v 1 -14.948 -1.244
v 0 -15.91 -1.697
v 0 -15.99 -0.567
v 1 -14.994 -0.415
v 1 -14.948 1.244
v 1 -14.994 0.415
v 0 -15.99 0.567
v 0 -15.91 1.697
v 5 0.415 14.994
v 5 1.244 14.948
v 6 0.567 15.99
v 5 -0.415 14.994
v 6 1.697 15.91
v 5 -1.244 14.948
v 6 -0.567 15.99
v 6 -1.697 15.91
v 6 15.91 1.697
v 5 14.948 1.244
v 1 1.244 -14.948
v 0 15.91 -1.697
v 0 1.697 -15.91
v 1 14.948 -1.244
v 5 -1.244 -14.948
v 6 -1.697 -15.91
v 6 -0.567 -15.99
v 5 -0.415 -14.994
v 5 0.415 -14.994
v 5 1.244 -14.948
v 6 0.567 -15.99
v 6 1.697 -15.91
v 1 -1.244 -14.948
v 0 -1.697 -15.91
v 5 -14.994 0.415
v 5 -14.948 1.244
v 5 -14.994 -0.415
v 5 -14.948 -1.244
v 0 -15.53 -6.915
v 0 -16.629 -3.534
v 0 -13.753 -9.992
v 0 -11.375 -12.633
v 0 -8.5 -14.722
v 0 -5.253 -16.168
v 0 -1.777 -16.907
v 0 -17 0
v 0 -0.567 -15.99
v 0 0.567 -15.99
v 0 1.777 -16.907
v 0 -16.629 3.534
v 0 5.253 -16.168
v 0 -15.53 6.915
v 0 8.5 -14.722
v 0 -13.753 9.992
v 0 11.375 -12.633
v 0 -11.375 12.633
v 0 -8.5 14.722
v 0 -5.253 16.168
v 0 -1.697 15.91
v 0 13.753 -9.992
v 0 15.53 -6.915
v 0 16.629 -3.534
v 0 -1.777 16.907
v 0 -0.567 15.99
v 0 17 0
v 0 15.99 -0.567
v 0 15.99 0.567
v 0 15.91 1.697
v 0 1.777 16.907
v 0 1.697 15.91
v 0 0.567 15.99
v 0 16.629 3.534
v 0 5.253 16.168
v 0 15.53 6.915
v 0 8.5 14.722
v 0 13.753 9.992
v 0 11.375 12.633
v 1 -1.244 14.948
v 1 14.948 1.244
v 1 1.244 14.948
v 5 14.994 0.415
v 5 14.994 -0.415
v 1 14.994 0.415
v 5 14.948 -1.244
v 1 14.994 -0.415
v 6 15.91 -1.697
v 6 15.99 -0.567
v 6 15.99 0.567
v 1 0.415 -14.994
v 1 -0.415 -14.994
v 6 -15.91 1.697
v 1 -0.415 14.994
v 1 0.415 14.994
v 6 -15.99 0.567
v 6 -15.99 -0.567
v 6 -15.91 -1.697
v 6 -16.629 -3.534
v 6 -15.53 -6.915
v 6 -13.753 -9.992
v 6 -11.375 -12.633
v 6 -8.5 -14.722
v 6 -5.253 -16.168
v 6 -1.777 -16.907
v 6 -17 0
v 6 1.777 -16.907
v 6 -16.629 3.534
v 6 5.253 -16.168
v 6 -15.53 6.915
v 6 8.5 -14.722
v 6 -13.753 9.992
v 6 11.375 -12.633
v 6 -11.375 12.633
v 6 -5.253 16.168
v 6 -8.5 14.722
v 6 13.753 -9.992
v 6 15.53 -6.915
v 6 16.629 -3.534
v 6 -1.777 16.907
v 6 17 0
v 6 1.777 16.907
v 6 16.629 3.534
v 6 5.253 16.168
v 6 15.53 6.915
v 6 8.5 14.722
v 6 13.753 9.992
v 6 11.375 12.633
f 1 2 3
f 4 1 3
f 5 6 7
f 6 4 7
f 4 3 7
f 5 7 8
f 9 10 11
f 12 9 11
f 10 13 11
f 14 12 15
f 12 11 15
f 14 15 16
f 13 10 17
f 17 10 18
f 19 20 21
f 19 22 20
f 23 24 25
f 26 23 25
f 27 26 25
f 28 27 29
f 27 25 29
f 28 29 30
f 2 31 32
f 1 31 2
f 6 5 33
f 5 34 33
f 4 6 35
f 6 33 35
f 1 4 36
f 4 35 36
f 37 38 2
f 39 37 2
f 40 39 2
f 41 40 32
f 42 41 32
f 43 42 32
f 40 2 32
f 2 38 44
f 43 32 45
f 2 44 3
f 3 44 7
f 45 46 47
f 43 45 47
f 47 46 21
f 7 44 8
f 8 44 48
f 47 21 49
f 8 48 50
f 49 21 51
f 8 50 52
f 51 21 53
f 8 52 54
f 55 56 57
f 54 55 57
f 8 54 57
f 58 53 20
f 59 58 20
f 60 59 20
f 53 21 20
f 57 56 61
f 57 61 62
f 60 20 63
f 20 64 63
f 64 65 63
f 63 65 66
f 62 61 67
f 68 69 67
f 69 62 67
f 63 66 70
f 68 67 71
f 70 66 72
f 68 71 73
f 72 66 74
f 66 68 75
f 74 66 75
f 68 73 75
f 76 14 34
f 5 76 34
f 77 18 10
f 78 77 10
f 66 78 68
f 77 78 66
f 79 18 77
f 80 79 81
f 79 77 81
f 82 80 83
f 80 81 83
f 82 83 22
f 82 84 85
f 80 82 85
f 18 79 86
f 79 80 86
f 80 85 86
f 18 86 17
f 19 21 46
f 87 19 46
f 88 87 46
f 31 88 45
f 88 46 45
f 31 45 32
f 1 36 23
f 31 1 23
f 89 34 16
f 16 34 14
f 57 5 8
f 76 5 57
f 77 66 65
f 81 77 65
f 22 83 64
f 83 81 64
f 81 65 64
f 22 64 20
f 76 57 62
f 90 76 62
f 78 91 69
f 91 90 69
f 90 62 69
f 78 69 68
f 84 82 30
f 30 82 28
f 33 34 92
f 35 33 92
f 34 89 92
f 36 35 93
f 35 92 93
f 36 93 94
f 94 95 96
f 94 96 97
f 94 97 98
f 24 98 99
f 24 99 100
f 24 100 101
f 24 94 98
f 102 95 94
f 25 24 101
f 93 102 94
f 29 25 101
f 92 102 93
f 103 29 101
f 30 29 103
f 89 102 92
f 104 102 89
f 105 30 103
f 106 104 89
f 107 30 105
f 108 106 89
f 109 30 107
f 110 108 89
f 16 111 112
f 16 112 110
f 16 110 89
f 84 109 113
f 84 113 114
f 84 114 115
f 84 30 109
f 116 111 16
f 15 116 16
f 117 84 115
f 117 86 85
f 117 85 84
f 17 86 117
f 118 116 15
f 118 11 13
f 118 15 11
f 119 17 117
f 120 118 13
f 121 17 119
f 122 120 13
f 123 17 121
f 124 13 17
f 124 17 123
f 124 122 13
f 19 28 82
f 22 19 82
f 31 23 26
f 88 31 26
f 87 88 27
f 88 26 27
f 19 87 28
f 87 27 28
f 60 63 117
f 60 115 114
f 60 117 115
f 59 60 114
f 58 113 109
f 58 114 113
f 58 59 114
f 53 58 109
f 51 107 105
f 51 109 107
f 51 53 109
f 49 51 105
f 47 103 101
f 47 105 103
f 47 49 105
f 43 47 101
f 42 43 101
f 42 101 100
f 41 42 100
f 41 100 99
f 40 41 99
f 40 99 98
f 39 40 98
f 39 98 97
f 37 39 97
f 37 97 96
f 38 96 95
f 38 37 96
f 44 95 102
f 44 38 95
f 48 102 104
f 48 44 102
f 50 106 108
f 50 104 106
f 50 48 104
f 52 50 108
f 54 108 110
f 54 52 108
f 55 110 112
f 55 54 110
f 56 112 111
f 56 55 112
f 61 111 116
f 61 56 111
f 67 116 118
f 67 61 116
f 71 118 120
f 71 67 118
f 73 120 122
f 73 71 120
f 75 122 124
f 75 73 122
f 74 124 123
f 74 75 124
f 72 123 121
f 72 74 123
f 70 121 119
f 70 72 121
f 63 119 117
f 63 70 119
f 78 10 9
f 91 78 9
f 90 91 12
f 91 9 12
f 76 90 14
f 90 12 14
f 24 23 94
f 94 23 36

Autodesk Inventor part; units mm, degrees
ref_plane "YZ Plane" through (0, 0, 0) normal (1, 0, 0) x (0, 1, 0)
ref_plane "XZ Plane" through (0, 0, 0) normal (0, 1, 0) x (-1, 0, 0)
ref_plane "XY Plane" through (0, 0, 0) normal (0, 0, 1) x (1, 0, 0)
sketch "스케치1" plane through (0, 0, 0) normal (1, 0, 0) x (0, 1, 0)
  circle A0 centre (0, 0) radius 15
  circle A1 centre (0, 0) radius 17
  dimension "d0" = 30
  dimension "d1" = 2
extrude "돌출1" add sketch "스케치1" along normal blind 6
sketch "스케치2" plane through (6, 0, 0) normal (1, 0, 0) x (0, 0, -1)
  line L0 (0, -16.1927) -> (16.1927, 0)
  line L1 (16.1927, 0) -> (0, 16.1927)
  line L2 (0, 16.1927) -> (-16.1927, 0)
  line L3 (-16.1927, 0) -> (0, -16.1927)
  line L4 (0, -16.1927) -> (0, 16.1927) construction
  line L5 (16.1927, 0) -> (-16.1927, 0) construction
  circle A0 centre (0, 0) radius 15 projected
  point P0 (-14.9483, -1.2445)
  point P1 (-14.9483, 1.2445)
  point P2 (-1.2445, 14.9483)
  point P3 (1.2445, 14.9483)
  point P4 (1.2445, -14.9483)
  point P5 (-1.2445, -14.9483)
  point P6 (14.9483, 1.2445)
  point P7 (14.9483, -1.2445)
  dimension "d4" = 22.9
  dimension "d5" = 22.9
extrude "돌출2" add sketch "스케치2" against normal up to surface (6 mm away) contours L3 A0 L0 | L0 A0 | A0 L3 | A0 L1 L0 | L3 L2 A0 | A0 L2 | L1 A0 | L2 L1 A0
chamfer "모따기1" distance 1 angle 45 16 edges at (6, -8.0964, -8.0964) (0, -8.0964, -8.0964) (6, -8.0964, 8.0964) (0, -8.0964, 8.0964) (6, -15, 0) (0, -15, 0) (0, 0, 15) (6, 0, 15) (6, 8.0964, 8.0964) (0, 8.0964, 8.0964) (6, 8.0964, -8.0964) (0, 8.0964, -8.0964) (6, 15, 0) (0, 15, 0) (0, 0, -15) (6, 0, -15)
equation "\"d5\" = d4"
equation "\"joint4_belt_centor\" = 157.367"
equation "\"joint4_axis2_L\" = 58.803"
equation "\"joint4_axis2_b1\" = 35"
equation "\"joint4_axis2_d\" = 19"
equation "\"joint4_miter_m\" = 2"
equation "\"joint4_miter_a\" = 20deg"
equation "\"joint4_miter_z\" = 79"
equation "\"joint4_miter_b\" = 6.90139"
equation "\"joint4_axis3_L\" = 23.5"
equation "\"joint3_belt_centor\" = 157.367"
equation "\"joint3_axis2_L\" = 63.75"
equation "\"joint3_axis2_b1\" = 38"
equation "\"joint3_axis2_d\" = 29"
equation "\"joint3_planetary_m\" = 2"
equation "\"joint3_planetary_a\" = 20deg"
equation "\"joint3_planetary_np\" = 4"
equation "\"joint3_sun_b\" = 19"
equation "\"joint3_planet_b\" = 19"
equation "\"joint3_ring_b\" = 18"
equation "\"joint3_axis3_d\" = 29"
equation "\"joint3_miter_m\" = 4"
equation "\"joint3_miter_a\" = 20deg"
equation "\"joint3_miter_z1\" = 26"
equation "\"joint3_miter_z2\" = 39"
equation "\"joint3_miter_b\" = 25.07657"
equation "\"joint3_axis4_L\" = 43.706"
properties part number "joint3_washer1" material "PLA filament"
